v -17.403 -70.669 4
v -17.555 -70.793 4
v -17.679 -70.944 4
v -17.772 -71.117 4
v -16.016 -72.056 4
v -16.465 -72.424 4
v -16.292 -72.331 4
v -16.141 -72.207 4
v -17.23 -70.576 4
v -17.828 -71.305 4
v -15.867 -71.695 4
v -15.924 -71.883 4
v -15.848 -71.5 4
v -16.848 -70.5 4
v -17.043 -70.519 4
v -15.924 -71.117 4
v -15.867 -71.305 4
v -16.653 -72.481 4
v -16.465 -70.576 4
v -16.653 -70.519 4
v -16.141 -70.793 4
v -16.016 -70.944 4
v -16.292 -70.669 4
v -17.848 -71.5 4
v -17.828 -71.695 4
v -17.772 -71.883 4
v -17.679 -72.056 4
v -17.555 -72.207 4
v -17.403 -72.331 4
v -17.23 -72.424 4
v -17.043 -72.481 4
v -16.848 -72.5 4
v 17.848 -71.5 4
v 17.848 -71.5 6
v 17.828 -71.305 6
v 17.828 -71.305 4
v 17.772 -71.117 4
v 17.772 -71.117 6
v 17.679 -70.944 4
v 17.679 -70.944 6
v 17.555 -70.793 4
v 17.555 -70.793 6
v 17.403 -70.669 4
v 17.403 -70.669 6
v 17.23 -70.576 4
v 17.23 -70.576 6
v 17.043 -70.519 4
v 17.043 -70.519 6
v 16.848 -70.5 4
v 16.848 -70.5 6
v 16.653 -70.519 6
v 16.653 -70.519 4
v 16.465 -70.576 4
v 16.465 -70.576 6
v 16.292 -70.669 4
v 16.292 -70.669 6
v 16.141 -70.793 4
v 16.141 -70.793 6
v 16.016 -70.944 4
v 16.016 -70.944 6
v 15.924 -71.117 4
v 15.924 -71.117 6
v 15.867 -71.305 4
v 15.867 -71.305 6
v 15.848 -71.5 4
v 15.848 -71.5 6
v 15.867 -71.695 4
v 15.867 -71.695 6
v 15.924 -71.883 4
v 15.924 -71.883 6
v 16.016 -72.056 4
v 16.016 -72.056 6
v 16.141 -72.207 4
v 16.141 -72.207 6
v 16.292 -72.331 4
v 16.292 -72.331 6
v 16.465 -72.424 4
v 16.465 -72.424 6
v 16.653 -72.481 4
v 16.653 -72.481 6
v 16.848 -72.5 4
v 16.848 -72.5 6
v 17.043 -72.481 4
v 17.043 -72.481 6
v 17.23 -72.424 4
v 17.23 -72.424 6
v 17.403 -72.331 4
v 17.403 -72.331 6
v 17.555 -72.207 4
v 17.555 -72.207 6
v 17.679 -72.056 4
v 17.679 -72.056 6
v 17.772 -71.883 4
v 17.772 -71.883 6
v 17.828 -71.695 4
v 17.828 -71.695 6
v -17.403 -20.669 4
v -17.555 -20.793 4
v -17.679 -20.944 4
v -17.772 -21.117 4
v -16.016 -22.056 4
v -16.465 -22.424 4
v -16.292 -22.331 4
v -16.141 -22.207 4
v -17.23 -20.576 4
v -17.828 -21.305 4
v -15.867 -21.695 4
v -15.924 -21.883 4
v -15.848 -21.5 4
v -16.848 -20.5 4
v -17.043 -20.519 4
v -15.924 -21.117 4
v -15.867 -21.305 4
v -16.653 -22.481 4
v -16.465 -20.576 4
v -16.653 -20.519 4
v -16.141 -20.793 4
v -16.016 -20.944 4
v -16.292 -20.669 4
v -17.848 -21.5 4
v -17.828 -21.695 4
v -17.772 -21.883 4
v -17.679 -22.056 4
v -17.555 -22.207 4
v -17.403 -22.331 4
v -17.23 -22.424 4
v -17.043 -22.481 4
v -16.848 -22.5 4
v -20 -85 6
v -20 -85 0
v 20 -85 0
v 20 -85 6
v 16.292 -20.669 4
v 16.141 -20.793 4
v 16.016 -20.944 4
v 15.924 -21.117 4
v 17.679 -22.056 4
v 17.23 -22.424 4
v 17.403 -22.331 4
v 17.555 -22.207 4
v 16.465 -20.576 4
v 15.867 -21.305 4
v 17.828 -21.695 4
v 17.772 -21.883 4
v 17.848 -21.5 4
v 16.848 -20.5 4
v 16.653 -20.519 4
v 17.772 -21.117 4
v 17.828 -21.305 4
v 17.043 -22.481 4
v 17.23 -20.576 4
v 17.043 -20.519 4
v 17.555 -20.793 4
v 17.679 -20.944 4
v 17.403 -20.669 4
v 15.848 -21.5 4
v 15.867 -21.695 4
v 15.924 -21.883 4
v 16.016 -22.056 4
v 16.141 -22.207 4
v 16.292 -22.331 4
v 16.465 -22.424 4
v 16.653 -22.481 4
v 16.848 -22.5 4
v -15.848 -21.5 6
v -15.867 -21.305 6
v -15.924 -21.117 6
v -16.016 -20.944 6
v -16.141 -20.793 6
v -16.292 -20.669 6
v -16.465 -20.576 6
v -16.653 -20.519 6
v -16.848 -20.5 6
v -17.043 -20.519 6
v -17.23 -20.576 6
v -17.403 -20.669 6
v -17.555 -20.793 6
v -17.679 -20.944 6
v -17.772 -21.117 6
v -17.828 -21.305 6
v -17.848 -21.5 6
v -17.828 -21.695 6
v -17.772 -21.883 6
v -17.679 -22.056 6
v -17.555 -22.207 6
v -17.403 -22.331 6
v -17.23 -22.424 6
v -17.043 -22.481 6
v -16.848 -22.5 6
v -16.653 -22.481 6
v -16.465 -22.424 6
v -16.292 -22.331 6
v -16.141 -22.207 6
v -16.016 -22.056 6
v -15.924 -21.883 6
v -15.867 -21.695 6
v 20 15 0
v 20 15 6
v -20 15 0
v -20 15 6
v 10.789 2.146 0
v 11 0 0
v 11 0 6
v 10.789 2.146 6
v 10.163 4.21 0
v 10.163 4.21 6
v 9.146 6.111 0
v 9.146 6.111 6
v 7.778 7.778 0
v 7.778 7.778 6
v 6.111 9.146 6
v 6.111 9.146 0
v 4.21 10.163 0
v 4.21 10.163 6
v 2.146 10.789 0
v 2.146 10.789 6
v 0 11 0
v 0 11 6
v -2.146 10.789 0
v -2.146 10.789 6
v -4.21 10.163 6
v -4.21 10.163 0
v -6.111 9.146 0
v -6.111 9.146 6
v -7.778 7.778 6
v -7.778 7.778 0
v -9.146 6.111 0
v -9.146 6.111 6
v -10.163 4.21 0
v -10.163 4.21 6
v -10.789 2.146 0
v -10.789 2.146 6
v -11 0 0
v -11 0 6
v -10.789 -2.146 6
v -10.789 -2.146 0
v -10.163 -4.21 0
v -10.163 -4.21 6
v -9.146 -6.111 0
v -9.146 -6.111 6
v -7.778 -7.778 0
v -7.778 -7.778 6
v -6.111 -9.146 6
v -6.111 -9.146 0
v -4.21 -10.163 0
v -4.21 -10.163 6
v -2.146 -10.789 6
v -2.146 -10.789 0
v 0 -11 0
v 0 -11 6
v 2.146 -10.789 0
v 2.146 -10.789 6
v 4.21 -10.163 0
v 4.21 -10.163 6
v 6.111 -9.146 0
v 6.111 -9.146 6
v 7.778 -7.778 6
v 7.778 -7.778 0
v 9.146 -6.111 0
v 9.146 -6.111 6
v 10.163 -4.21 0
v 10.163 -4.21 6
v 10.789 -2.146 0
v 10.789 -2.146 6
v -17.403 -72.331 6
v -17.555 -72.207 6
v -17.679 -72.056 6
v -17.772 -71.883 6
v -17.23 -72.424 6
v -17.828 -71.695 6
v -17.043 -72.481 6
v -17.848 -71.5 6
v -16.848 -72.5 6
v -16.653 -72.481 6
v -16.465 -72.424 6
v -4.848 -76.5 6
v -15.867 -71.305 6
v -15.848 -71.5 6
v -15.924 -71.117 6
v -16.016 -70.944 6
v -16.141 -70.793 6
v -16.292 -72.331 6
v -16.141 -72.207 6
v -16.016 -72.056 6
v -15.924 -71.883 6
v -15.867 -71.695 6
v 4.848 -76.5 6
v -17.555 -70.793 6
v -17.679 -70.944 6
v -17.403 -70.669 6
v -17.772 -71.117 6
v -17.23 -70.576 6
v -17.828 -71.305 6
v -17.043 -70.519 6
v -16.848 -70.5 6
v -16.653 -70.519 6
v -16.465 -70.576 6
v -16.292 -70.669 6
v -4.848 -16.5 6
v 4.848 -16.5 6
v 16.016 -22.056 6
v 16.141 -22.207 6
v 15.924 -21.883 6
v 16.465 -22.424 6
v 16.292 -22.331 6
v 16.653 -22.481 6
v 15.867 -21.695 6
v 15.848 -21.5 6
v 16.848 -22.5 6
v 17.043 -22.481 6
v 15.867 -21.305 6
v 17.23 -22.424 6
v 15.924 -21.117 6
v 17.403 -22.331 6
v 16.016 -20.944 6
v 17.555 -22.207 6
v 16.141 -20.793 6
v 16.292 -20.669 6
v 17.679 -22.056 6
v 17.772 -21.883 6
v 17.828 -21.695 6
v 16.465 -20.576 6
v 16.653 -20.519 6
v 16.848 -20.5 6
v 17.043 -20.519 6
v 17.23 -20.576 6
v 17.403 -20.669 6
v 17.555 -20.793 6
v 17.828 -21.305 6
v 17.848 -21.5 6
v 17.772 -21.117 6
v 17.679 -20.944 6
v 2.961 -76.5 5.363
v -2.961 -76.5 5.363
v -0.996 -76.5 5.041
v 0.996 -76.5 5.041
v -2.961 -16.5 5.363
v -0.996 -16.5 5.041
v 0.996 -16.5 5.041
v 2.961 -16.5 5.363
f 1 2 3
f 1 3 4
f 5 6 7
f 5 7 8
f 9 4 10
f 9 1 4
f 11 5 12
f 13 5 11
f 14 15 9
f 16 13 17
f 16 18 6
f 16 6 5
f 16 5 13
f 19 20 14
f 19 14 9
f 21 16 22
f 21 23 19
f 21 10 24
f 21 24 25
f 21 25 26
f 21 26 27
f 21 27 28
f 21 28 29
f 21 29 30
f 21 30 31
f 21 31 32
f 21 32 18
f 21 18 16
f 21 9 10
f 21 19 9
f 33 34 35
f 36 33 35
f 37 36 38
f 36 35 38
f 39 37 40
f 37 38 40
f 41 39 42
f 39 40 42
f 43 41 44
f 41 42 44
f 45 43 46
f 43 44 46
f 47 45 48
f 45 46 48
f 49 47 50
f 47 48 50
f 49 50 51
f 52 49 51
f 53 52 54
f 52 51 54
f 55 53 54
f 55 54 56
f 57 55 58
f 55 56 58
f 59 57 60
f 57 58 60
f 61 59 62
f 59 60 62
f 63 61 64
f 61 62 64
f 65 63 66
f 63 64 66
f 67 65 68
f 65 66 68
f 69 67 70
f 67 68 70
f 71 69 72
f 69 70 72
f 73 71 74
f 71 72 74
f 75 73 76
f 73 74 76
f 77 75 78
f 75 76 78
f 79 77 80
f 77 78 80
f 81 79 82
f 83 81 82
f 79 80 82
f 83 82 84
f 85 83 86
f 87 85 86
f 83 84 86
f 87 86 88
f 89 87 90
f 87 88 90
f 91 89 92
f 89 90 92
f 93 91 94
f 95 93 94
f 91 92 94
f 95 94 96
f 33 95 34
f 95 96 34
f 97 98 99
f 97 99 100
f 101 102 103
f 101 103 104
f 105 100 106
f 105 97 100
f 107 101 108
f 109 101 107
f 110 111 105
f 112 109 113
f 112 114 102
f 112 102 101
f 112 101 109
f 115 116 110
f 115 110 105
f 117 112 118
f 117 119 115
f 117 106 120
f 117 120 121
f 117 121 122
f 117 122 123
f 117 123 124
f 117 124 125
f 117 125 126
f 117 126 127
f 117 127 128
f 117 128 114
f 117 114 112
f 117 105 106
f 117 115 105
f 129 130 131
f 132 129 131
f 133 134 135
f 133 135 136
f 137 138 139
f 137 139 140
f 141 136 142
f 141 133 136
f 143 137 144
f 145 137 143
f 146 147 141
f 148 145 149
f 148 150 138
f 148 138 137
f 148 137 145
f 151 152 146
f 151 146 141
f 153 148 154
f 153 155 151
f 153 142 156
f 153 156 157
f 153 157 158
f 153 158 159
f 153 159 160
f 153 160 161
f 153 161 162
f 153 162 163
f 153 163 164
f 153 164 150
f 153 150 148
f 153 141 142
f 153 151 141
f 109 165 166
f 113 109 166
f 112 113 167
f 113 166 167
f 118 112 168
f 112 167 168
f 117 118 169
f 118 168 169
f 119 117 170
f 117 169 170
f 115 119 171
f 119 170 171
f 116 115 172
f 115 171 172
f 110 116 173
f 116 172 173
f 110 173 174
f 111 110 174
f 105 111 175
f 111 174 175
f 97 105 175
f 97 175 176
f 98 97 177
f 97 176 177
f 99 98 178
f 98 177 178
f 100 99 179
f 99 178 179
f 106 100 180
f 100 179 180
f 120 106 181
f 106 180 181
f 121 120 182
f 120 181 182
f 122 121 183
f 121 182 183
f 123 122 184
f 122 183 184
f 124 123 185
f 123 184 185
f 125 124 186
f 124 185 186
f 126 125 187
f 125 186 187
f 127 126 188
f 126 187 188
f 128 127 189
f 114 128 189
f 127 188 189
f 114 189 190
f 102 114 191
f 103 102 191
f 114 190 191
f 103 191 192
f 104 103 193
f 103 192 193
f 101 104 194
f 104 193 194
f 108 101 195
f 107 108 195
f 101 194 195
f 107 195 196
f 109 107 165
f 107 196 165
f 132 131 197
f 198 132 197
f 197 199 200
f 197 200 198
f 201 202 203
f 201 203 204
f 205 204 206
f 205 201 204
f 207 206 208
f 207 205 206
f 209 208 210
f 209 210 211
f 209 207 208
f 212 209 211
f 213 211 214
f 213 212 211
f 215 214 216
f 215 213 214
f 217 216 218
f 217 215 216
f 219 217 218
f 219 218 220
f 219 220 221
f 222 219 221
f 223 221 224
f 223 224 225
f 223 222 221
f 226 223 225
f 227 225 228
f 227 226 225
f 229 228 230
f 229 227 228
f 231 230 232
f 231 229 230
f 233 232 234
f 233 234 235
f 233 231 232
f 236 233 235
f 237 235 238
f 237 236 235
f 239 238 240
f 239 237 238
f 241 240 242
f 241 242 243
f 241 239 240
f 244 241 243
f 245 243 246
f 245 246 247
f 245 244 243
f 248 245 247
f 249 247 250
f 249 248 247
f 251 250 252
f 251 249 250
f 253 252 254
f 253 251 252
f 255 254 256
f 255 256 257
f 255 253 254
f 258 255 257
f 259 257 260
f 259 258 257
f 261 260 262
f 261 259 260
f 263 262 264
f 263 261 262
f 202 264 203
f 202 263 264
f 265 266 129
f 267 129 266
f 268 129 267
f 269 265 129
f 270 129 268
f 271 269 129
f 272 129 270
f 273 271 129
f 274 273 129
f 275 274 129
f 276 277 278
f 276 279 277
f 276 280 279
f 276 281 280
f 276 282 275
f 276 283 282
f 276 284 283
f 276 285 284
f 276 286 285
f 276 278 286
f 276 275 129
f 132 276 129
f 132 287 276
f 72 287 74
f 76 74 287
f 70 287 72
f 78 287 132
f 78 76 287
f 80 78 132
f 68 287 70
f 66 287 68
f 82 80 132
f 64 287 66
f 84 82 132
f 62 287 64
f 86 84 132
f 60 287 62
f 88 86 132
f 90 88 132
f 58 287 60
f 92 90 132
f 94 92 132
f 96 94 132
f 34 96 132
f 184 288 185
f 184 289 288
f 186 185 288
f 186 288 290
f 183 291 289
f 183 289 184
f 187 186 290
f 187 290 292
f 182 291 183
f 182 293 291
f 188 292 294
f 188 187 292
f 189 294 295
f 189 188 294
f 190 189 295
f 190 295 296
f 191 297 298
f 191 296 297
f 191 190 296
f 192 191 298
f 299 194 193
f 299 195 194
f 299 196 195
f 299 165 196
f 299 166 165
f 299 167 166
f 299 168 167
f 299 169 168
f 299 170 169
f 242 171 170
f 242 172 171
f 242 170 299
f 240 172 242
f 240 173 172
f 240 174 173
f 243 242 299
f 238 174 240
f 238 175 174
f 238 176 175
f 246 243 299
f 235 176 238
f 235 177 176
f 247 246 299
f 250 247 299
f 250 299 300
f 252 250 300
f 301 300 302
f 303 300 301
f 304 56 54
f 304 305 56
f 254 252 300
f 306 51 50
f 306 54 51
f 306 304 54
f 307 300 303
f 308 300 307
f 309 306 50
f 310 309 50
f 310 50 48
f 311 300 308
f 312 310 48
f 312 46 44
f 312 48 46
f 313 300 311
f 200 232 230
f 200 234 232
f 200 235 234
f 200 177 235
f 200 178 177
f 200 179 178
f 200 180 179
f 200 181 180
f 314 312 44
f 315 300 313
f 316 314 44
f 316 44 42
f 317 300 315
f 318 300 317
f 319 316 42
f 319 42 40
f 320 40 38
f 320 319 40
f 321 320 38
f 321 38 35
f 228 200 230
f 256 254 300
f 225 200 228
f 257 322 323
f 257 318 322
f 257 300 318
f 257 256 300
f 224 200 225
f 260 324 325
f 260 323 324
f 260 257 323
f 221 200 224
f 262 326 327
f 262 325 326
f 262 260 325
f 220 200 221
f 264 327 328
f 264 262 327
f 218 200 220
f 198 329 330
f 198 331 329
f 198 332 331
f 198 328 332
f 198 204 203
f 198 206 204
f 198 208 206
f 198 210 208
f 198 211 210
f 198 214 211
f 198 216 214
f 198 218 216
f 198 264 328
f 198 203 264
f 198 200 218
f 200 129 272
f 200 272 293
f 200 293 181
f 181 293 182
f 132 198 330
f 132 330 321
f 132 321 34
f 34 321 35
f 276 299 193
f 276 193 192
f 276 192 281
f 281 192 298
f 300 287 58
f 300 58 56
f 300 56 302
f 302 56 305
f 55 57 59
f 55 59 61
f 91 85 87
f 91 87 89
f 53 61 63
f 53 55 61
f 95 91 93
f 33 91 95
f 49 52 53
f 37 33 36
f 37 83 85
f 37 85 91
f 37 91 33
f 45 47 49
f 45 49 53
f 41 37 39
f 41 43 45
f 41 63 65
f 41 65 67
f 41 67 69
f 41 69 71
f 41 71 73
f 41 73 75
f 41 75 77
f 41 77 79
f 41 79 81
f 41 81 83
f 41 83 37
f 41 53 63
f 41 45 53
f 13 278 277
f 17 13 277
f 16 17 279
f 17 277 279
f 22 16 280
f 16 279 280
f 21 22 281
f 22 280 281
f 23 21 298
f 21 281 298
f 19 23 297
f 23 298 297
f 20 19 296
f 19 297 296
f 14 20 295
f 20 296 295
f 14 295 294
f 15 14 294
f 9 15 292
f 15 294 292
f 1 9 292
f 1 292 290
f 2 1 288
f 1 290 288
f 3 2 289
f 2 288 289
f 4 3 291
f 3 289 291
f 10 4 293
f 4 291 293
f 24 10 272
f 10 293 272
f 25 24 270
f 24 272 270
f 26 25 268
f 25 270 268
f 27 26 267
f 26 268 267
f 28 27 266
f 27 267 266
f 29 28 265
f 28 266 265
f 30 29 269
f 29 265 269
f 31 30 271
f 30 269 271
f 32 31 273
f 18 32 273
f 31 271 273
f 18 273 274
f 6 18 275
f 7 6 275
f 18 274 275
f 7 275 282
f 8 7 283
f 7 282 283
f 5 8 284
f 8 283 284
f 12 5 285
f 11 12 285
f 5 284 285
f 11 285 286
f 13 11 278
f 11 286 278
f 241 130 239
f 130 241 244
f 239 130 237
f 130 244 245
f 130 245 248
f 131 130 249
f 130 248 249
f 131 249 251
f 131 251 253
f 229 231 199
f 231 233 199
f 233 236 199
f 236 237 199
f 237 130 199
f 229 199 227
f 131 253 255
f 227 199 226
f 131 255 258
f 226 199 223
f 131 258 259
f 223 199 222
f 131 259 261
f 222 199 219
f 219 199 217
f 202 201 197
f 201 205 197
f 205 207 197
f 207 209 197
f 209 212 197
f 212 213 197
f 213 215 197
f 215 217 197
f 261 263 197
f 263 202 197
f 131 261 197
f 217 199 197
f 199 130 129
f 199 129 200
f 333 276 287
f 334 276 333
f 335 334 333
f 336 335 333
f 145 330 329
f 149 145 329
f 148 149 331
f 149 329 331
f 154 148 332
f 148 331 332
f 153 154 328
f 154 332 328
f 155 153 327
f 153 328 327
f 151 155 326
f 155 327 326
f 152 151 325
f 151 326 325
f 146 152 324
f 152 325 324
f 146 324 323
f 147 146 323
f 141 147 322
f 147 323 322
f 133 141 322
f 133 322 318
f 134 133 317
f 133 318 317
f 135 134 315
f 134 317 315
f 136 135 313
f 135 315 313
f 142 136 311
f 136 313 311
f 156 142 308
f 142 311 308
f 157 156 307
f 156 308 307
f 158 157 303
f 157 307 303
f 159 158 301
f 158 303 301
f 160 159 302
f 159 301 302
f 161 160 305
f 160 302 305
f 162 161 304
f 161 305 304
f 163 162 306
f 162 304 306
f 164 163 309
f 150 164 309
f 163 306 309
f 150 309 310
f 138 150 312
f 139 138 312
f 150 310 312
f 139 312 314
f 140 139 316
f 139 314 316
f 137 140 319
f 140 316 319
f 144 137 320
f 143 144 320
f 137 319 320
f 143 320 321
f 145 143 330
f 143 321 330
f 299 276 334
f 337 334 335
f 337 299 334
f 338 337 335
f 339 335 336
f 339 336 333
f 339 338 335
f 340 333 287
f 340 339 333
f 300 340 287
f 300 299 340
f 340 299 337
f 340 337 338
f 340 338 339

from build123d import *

# Parameters (mm, degrees)
F0_W     = 40
F0_H     = 100
F0_R     = 11
F1_DEPTH = 6
F3_START = 16.5
F2_R     = 12.25
F3_DEPTH = 60
F4_R     = 1
F5_DEPTH = 2


with BuildPart() as f1:
    # F0 (on Top) → F1 (new body)
    with BuildSketch(Plane.XY):
        with Locations((0, -35)):
            Rectangle(F0_W, F0_H)
        Circle(F0_R, mode=Mode.SUBTRACT)
    extrude(amount=F1_DEPTH)

    # F2 (on Front) → F3 (cut)
    with BuildSketch(Plane.XZ.offset(F3_START)):
        with Locations((0, 17.25)):
            Circle(F2_R)
    extrude(amount=F3_DEPTH, mode=Mode.SUBTRACT)

    # F4 (on face) → F5 (cut)
    with BuildSketch(Plane.XY.offset(6)):
        with Locations((-16.8476798574, -21.5)):
            Circle(F4_R)
        with Locations((16.8476798574, -21.5)):
            Circle(F4_R)
        with Locations((-16.8476798574, -71.5)):
            Circle(F4_R)
        with Locations((16.8476798574, -71.5)):
            Circle(F4_R)
    extrude(amount=-F5_DEPTH, mode=Mode.SUBTRACT)


solid = f1.part
